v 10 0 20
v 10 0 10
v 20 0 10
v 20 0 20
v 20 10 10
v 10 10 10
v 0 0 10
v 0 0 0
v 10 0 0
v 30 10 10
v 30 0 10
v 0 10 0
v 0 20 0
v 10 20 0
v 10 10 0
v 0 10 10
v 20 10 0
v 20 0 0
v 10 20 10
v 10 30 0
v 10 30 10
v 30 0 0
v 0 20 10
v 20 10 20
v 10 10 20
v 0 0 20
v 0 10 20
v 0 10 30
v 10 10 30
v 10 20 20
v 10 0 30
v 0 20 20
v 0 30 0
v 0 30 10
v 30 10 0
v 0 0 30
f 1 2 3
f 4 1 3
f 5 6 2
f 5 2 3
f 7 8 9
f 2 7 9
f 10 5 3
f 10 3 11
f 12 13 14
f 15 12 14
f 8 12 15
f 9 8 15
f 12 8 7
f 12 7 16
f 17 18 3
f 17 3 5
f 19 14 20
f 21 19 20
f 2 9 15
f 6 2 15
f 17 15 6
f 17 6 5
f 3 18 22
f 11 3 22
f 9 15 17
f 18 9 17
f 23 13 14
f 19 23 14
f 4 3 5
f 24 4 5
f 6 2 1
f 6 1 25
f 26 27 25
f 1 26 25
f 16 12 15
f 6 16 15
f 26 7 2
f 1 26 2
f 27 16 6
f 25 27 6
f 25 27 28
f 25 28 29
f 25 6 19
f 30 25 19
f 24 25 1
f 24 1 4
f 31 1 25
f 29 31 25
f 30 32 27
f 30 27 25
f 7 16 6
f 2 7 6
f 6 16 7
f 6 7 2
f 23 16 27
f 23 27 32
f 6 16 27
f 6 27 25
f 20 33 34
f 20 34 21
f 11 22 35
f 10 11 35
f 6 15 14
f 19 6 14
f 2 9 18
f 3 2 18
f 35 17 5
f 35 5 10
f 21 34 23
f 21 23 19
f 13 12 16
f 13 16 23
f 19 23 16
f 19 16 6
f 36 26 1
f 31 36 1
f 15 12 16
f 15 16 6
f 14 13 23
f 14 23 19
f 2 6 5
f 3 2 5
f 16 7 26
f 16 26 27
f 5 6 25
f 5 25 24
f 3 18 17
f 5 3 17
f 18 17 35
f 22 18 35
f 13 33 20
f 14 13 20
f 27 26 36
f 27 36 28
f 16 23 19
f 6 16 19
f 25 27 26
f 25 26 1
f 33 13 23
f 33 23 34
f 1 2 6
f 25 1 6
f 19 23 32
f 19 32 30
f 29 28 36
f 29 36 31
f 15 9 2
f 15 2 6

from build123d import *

# Parameters (mm, degrees)
BOX_W        = 10
BOX_H        = 10
BOX_DEPTH    = 10
BOX001_W     = 10
BOX001_H     = 10
BOX001_DEPTH = 10
BOX002_W     = 10
BOX002_H     = 10
BOX002_DEPTH = 10
BOX003_W     = 10
BOX003_H     = 10
BOX003_DEPTH = 10
BOX004_W     = 10
BOX004_H     = 10
BOX004_DEPTH = 10
BOX005_W     = 10
BOX005_H     = 10
BOX005_DEPTH = 10
BOX006_W     = 10
BOX006_H     = 10
BOX006_DEPTH = 10
BOX007_W     = 10
BOX007_H     = 10
BOX007_DEPTH = 10
BOX008_W     = 10
BOX008_H     = 10
BOX008_DEPTH = 10


with BuildPart() as nivell1_cub1:
    # Box → Box (new body)
    with BuildSketch(Plane(origin=(10, 0, 0), x_dir=(1, 0, 0), z_dir=(0, 0, 1))):
        with Locations((5, 5)):
            Rectangle(BOX_W, BOX_H)
    extrude(amount=BOX_DEPTH)


with BuildPart() as nivell1_cub2:
    # Box001 → Box001 (new body)
    with BuildSketch(Plane(origin=(20, 0, 0), x_dir=(1, 0, 0), z_dir=(0, 0, 1))):
        with Locations((5, 5)):
            Rectangle(BOX001_W, BOX001_H)
    extrude(amount=BOX001_DEPTH)


with BuildPart() as nivell1_cub3:
    # Box002 → Box002 (new body)
    with BuildSketch(Plane.XY):
        with Locations((5, 5)):
            Rectangle(BOX002_W, BOX002_H)
    extrude(amount=BOX002_DEPTH)


with BuildPart() as nivell1_cub4:
    # Box003 → Box003 (new body)
    with BuildSketch(Plane(origin=(0, 10, 0), x_dir=(1, 0, 0), z_dir=(0, 0, 1))):
        with Locations((5, 5)):
            Rectangle(BOX003_W, BOX003_H)
    extrude(amount=BOX003_DEPTH)


with BuildPart() as nivell1_cub5:
    # Box004 → Box004 (new body)
    with BuildSketch(Plane(origin=(0, 20, 0), x_dir=(1, 0, 0), z_dir=(0, 0, 1))):
        with Locations((5, 5)):
            Rectangle(BOX004_W, BOX004_H)
    extrude(amount=BOX004_DEPTH)


with BuildPart() as nivell2_cub1:
    # Box005 → Box005 (new body)
    with BuildSketch(Plane.XY.offset(10)):
        with Locations((5, 5)):
            Rectangle(BOX005_W, BOX005_H)
    extrude(amount=BOX005_DEPTH)


with BuildPart() as nivell2_cub2:
    # Box006 → Box006 (new body)
    with BuildSketch(Plane(origin=(0, 10, 10), x_dir=(1, 0, 0), z_dir=(0, 0, 1))):
        with Locations((5, 5)):
            Rectangle(BOX006_W, BOX006_H)
    extrude(amount=BOX006_DEPTH)


with BuildPart() as nivell2_cub3:
    # Box007 → Box007 (new body)
    with BuildSketch(Plane(origin=(10, 0, 10), x_dir=(1, 0, 0), z_dir=(0, 0, 1))):
        with Locations((5, 5)):
            Rectangle(BOX007_W, BOX007_H)
    extrude(amount=BOX007_DEPTH)


with BuildPart() as nivell3_cub1:
    # Box008 → Box008 (new body)
    with BuildSketch(Plane.XY.offset(20)):
        with Locations((5, 5)):
            Rectangle(BOX008_W, BOX008_H)
    extrude(amount=BOX008_DEPTH)


solid = Compound([nivell1_cub1.part, nivell1_cub2.part, nivell1_cub3.part, nivell1_cub4.part, nivell1_cub5.part, nivell2_cub1.part, nivell2_cub2.part, nivell2_cub3.part, nivell3_cub1.part])
